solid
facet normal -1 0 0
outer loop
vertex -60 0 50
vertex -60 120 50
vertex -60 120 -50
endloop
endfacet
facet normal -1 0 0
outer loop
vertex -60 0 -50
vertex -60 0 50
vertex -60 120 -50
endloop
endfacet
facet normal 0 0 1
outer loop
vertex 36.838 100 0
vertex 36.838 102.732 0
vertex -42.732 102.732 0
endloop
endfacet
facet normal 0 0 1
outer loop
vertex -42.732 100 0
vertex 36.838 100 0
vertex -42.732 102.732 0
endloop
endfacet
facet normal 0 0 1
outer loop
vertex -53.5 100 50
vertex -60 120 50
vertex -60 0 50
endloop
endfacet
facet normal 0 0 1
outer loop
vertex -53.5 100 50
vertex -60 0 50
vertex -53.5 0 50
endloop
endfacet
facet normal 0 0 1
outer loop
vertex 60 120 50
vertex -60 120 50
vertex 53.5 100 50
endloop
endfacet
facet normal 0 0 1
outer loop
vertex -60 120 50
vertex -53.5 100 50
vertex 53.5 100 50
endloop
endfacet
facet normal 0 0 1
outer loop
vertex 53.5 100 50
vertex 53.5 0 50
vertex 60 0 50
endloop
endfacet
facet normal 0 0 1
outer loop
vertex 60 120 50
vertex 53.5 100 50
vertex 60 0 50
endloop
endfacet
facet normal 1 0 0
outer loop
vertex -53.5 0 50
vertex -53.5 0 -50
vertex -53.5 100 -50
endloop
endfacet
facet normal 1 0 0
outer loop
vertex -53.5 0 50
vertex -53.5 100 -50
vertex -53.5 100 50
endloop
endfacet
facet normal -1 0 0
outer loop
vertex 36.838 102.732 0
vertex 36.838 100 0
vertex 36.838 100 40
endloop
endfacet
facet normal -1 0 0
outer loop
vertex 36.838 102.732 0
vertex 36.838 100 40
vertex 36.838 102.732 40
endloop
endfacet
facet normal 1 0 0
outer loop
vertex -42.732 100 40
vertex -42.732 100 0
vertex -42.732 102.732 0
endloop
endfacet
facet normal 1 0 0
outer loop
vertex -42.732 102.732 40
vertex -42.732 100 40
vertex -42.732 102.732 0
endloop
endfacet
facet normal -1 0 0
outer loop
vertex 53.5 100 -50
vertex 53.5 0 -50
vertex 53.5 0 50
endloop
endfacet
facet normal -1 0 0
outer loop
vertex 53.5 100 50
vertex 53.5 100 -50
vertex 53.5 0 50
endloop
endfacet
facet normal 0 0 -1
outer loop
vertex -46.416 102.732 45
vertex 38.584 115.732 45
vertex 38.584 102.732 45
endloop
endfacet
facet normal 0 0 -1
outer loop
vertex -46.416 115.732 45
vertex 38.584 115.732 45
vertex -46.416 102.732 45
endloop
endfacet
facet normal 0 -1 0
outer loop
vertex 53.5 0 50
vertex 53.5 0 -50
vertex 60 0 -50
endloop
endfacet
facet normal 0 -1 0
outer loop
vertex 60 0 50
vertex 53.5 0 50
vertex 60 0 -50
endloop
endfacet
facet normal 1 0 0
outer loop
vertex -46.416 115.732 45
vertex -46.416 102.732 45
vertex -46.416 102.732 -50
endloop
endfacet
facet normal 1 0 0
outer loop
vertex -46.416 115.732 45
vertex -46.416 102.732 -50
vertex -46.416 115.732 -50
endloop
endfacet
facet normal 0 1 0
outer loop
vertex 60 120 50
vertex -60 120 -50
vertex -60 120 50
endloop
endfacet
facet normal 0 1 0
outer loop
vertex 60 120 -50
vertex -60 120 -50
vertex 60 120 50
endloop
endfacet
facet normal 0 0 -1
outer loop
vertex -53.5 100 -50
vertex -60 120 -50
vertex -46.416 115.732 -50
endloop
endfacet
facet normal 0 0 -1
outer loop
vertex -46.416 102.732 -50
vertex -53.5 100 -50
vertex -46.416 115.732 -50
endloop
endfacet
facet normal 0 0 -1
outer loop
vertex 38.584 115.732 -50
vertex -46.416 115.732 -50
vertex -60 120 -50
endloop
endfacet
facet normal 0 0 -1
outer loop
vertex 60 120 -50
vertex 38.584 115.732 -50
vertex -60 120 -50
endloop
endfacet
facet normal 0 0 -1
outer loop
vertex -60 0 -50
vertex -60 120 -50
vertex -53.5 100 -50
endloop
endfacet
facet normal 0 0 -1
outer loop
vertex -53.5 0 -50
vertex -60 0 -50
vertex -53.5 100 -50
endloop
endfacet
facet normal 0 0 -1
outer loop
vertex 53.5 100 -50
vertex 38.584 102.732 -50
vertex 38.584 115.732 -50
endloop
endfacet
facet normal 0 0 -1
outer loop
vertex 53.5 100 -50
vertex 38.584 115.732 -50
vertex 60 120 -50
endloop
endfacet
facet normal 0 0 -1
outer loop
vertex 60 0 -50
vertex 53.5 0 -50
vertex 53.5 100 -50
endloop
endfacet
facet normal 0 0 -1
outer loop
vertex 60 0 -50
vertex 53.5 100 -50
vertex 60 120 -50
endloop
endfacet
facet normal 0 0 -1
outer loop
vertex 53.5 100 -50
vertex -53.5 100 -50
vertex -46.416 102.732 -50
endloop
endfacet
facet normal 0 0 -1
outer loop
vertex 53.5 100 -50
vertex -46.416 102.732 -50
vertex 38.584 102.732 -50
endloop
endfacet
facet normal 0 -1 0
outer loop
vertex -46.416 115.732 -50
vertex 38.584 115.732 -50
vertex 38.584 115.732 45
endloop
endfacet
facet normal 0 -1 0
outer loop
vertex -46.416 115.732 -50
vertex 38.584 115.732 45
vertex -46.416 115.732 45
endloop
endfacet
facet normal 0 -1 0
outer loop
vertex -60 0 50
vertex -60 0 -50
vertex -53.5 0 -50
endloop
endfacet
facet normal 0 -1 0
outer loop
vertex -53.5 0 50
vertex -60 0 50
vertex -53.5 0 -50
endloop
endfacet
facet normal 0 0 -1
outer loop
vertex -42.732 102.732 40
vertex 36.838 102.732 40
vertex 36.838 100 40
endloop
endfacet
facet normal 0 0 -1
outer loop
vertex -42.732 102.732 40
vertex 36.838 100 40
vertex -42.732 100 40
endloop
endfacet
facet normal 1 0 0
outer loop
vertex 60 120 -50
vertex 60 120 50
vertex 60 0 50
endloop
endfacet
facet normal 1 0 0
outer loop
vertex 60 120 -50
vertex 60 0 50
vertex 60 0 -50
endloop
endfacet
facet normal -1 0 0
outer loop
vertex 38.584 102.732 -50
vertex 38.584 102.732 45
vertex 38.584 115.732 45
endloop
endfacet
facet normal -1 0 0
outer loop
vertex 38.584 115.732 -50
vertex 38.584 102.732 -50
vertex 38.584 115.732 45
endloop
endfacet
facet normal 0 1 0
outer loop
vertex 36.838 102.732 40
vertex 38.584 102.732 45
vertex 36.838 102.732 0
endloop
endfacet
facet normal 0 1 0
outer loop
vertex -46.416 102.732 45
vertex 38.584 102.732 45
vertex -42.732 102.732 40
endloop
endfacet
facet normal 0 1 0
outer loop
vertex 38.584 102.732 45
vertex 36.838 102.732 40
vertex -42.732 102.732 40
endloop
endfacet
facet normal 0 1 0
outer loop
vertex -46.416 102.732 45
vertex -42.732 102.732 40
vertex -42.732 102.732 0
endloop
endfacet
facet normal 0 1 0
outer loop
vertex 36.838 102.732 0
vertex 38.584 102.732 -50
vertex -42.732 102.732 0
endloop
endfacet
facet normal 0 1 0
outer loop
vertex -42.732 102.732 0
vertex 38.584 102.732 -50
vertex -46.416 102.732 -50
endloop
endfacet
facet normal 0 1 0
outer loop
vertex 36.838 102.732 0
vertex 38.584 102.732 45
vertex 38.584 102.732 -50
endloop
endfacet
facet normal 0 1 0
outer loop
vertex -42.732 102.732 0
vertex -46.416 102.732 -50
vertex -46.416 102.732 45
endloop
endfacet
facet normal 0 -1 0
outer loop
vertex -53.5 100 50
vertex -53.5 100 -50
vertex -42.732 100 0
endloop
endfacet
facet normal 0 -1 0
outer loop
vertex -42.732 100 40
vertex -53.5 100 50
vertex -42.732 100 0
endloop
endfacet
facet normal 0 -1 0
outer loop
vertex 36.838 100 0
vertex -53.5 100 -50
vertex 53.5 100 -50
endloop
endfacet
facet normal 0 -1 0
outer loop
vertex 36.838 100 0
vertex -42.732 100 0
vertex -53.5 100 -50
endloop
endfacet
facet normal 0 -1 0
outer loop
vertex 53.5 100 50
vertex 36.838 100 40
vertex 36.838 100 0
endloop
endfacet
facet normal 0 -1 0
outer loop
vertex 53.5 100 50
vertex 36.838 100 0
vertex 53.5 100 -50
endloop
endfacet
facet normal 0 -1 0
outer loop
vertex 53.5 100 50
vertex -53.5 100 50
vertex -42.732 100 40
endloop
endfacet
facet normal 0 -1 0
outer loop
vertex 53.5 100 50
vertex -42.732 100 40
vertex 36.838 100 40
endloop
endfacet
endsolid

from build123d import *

# Parameters (mm, degrees)
SKETCH1_W           = 120
SKETCH1_H           = 100
BOSS_EXTRUDE1_DEPTH = 120
SKETCH2_W           = 107
SKETCH2_H           = 120
CUT_EXTRUDE1_DEPTH  = 100
SKETCH4_W           = 85
SKETCH4_H           = 13
CUT_EXTRUDE2_DEPTH  = 95
CUT_EXTRUDE3_START  = -50
SKETCH5_W           = 79.569660058
SKETCH5_H           = 2.731854476
CUT_EXTRUDE3_DEPTH  = 40


with BuildPart() as part:
    # Sketch1 → Boss-Extrude1 (new body)
    with BuildSketch(Plane(origin=(0, 0, 0), x_dir=(1, 0, 0), z_dir=(0, 1, 0))):
        Rectangle(SKETCH1_W, SKETCH1_H)
    extrude(amount=BOSS_EXTRUDE1_DEPTH)

    # Sketch2 → Cut-Extrude1 (cut)
    with BuildSketch(Plane.XZ):
        Rectangle(SKETCH2_W, SKETCH2_H)
    extrude(amount=-CUT_EXTRUDE1_DEPTH, mode=Mode.SUBTRACT)

    # Sketch4 → Cut-Extrude2 (cut)
    with BuildSketch(Plane(origin=(0, 0, -50), x_dir=(-1, 0, 0), z_dir=(0, 0, -1))):
        with Locations((3.915635034, 109.231854476)):
            Rectangle(SKETCH4_W, SKETCH4_H)
    extrude(amount=-CUT_EXTRUDE2_DEPTH, mode=Mode.SUBTRACT)

    # Sketch5 → Cut-Extrude3 (cut)
    with BuildSketch(Plane(origin=(0, 0, -50), x_dir=(-1, 0, 0), z_dir=(0, 0, -1)).offset(CUT_EXTRUDE3_START)):
        with Locations((2.947024447, 101.365927238)):
            Rectangle(SKETCH5_W, SKETCH5_H)
    extrude(amount=-CUT_EXTRUDE3_DEPTH, mode=Mode.SUBTRACT)


solid = part.part
